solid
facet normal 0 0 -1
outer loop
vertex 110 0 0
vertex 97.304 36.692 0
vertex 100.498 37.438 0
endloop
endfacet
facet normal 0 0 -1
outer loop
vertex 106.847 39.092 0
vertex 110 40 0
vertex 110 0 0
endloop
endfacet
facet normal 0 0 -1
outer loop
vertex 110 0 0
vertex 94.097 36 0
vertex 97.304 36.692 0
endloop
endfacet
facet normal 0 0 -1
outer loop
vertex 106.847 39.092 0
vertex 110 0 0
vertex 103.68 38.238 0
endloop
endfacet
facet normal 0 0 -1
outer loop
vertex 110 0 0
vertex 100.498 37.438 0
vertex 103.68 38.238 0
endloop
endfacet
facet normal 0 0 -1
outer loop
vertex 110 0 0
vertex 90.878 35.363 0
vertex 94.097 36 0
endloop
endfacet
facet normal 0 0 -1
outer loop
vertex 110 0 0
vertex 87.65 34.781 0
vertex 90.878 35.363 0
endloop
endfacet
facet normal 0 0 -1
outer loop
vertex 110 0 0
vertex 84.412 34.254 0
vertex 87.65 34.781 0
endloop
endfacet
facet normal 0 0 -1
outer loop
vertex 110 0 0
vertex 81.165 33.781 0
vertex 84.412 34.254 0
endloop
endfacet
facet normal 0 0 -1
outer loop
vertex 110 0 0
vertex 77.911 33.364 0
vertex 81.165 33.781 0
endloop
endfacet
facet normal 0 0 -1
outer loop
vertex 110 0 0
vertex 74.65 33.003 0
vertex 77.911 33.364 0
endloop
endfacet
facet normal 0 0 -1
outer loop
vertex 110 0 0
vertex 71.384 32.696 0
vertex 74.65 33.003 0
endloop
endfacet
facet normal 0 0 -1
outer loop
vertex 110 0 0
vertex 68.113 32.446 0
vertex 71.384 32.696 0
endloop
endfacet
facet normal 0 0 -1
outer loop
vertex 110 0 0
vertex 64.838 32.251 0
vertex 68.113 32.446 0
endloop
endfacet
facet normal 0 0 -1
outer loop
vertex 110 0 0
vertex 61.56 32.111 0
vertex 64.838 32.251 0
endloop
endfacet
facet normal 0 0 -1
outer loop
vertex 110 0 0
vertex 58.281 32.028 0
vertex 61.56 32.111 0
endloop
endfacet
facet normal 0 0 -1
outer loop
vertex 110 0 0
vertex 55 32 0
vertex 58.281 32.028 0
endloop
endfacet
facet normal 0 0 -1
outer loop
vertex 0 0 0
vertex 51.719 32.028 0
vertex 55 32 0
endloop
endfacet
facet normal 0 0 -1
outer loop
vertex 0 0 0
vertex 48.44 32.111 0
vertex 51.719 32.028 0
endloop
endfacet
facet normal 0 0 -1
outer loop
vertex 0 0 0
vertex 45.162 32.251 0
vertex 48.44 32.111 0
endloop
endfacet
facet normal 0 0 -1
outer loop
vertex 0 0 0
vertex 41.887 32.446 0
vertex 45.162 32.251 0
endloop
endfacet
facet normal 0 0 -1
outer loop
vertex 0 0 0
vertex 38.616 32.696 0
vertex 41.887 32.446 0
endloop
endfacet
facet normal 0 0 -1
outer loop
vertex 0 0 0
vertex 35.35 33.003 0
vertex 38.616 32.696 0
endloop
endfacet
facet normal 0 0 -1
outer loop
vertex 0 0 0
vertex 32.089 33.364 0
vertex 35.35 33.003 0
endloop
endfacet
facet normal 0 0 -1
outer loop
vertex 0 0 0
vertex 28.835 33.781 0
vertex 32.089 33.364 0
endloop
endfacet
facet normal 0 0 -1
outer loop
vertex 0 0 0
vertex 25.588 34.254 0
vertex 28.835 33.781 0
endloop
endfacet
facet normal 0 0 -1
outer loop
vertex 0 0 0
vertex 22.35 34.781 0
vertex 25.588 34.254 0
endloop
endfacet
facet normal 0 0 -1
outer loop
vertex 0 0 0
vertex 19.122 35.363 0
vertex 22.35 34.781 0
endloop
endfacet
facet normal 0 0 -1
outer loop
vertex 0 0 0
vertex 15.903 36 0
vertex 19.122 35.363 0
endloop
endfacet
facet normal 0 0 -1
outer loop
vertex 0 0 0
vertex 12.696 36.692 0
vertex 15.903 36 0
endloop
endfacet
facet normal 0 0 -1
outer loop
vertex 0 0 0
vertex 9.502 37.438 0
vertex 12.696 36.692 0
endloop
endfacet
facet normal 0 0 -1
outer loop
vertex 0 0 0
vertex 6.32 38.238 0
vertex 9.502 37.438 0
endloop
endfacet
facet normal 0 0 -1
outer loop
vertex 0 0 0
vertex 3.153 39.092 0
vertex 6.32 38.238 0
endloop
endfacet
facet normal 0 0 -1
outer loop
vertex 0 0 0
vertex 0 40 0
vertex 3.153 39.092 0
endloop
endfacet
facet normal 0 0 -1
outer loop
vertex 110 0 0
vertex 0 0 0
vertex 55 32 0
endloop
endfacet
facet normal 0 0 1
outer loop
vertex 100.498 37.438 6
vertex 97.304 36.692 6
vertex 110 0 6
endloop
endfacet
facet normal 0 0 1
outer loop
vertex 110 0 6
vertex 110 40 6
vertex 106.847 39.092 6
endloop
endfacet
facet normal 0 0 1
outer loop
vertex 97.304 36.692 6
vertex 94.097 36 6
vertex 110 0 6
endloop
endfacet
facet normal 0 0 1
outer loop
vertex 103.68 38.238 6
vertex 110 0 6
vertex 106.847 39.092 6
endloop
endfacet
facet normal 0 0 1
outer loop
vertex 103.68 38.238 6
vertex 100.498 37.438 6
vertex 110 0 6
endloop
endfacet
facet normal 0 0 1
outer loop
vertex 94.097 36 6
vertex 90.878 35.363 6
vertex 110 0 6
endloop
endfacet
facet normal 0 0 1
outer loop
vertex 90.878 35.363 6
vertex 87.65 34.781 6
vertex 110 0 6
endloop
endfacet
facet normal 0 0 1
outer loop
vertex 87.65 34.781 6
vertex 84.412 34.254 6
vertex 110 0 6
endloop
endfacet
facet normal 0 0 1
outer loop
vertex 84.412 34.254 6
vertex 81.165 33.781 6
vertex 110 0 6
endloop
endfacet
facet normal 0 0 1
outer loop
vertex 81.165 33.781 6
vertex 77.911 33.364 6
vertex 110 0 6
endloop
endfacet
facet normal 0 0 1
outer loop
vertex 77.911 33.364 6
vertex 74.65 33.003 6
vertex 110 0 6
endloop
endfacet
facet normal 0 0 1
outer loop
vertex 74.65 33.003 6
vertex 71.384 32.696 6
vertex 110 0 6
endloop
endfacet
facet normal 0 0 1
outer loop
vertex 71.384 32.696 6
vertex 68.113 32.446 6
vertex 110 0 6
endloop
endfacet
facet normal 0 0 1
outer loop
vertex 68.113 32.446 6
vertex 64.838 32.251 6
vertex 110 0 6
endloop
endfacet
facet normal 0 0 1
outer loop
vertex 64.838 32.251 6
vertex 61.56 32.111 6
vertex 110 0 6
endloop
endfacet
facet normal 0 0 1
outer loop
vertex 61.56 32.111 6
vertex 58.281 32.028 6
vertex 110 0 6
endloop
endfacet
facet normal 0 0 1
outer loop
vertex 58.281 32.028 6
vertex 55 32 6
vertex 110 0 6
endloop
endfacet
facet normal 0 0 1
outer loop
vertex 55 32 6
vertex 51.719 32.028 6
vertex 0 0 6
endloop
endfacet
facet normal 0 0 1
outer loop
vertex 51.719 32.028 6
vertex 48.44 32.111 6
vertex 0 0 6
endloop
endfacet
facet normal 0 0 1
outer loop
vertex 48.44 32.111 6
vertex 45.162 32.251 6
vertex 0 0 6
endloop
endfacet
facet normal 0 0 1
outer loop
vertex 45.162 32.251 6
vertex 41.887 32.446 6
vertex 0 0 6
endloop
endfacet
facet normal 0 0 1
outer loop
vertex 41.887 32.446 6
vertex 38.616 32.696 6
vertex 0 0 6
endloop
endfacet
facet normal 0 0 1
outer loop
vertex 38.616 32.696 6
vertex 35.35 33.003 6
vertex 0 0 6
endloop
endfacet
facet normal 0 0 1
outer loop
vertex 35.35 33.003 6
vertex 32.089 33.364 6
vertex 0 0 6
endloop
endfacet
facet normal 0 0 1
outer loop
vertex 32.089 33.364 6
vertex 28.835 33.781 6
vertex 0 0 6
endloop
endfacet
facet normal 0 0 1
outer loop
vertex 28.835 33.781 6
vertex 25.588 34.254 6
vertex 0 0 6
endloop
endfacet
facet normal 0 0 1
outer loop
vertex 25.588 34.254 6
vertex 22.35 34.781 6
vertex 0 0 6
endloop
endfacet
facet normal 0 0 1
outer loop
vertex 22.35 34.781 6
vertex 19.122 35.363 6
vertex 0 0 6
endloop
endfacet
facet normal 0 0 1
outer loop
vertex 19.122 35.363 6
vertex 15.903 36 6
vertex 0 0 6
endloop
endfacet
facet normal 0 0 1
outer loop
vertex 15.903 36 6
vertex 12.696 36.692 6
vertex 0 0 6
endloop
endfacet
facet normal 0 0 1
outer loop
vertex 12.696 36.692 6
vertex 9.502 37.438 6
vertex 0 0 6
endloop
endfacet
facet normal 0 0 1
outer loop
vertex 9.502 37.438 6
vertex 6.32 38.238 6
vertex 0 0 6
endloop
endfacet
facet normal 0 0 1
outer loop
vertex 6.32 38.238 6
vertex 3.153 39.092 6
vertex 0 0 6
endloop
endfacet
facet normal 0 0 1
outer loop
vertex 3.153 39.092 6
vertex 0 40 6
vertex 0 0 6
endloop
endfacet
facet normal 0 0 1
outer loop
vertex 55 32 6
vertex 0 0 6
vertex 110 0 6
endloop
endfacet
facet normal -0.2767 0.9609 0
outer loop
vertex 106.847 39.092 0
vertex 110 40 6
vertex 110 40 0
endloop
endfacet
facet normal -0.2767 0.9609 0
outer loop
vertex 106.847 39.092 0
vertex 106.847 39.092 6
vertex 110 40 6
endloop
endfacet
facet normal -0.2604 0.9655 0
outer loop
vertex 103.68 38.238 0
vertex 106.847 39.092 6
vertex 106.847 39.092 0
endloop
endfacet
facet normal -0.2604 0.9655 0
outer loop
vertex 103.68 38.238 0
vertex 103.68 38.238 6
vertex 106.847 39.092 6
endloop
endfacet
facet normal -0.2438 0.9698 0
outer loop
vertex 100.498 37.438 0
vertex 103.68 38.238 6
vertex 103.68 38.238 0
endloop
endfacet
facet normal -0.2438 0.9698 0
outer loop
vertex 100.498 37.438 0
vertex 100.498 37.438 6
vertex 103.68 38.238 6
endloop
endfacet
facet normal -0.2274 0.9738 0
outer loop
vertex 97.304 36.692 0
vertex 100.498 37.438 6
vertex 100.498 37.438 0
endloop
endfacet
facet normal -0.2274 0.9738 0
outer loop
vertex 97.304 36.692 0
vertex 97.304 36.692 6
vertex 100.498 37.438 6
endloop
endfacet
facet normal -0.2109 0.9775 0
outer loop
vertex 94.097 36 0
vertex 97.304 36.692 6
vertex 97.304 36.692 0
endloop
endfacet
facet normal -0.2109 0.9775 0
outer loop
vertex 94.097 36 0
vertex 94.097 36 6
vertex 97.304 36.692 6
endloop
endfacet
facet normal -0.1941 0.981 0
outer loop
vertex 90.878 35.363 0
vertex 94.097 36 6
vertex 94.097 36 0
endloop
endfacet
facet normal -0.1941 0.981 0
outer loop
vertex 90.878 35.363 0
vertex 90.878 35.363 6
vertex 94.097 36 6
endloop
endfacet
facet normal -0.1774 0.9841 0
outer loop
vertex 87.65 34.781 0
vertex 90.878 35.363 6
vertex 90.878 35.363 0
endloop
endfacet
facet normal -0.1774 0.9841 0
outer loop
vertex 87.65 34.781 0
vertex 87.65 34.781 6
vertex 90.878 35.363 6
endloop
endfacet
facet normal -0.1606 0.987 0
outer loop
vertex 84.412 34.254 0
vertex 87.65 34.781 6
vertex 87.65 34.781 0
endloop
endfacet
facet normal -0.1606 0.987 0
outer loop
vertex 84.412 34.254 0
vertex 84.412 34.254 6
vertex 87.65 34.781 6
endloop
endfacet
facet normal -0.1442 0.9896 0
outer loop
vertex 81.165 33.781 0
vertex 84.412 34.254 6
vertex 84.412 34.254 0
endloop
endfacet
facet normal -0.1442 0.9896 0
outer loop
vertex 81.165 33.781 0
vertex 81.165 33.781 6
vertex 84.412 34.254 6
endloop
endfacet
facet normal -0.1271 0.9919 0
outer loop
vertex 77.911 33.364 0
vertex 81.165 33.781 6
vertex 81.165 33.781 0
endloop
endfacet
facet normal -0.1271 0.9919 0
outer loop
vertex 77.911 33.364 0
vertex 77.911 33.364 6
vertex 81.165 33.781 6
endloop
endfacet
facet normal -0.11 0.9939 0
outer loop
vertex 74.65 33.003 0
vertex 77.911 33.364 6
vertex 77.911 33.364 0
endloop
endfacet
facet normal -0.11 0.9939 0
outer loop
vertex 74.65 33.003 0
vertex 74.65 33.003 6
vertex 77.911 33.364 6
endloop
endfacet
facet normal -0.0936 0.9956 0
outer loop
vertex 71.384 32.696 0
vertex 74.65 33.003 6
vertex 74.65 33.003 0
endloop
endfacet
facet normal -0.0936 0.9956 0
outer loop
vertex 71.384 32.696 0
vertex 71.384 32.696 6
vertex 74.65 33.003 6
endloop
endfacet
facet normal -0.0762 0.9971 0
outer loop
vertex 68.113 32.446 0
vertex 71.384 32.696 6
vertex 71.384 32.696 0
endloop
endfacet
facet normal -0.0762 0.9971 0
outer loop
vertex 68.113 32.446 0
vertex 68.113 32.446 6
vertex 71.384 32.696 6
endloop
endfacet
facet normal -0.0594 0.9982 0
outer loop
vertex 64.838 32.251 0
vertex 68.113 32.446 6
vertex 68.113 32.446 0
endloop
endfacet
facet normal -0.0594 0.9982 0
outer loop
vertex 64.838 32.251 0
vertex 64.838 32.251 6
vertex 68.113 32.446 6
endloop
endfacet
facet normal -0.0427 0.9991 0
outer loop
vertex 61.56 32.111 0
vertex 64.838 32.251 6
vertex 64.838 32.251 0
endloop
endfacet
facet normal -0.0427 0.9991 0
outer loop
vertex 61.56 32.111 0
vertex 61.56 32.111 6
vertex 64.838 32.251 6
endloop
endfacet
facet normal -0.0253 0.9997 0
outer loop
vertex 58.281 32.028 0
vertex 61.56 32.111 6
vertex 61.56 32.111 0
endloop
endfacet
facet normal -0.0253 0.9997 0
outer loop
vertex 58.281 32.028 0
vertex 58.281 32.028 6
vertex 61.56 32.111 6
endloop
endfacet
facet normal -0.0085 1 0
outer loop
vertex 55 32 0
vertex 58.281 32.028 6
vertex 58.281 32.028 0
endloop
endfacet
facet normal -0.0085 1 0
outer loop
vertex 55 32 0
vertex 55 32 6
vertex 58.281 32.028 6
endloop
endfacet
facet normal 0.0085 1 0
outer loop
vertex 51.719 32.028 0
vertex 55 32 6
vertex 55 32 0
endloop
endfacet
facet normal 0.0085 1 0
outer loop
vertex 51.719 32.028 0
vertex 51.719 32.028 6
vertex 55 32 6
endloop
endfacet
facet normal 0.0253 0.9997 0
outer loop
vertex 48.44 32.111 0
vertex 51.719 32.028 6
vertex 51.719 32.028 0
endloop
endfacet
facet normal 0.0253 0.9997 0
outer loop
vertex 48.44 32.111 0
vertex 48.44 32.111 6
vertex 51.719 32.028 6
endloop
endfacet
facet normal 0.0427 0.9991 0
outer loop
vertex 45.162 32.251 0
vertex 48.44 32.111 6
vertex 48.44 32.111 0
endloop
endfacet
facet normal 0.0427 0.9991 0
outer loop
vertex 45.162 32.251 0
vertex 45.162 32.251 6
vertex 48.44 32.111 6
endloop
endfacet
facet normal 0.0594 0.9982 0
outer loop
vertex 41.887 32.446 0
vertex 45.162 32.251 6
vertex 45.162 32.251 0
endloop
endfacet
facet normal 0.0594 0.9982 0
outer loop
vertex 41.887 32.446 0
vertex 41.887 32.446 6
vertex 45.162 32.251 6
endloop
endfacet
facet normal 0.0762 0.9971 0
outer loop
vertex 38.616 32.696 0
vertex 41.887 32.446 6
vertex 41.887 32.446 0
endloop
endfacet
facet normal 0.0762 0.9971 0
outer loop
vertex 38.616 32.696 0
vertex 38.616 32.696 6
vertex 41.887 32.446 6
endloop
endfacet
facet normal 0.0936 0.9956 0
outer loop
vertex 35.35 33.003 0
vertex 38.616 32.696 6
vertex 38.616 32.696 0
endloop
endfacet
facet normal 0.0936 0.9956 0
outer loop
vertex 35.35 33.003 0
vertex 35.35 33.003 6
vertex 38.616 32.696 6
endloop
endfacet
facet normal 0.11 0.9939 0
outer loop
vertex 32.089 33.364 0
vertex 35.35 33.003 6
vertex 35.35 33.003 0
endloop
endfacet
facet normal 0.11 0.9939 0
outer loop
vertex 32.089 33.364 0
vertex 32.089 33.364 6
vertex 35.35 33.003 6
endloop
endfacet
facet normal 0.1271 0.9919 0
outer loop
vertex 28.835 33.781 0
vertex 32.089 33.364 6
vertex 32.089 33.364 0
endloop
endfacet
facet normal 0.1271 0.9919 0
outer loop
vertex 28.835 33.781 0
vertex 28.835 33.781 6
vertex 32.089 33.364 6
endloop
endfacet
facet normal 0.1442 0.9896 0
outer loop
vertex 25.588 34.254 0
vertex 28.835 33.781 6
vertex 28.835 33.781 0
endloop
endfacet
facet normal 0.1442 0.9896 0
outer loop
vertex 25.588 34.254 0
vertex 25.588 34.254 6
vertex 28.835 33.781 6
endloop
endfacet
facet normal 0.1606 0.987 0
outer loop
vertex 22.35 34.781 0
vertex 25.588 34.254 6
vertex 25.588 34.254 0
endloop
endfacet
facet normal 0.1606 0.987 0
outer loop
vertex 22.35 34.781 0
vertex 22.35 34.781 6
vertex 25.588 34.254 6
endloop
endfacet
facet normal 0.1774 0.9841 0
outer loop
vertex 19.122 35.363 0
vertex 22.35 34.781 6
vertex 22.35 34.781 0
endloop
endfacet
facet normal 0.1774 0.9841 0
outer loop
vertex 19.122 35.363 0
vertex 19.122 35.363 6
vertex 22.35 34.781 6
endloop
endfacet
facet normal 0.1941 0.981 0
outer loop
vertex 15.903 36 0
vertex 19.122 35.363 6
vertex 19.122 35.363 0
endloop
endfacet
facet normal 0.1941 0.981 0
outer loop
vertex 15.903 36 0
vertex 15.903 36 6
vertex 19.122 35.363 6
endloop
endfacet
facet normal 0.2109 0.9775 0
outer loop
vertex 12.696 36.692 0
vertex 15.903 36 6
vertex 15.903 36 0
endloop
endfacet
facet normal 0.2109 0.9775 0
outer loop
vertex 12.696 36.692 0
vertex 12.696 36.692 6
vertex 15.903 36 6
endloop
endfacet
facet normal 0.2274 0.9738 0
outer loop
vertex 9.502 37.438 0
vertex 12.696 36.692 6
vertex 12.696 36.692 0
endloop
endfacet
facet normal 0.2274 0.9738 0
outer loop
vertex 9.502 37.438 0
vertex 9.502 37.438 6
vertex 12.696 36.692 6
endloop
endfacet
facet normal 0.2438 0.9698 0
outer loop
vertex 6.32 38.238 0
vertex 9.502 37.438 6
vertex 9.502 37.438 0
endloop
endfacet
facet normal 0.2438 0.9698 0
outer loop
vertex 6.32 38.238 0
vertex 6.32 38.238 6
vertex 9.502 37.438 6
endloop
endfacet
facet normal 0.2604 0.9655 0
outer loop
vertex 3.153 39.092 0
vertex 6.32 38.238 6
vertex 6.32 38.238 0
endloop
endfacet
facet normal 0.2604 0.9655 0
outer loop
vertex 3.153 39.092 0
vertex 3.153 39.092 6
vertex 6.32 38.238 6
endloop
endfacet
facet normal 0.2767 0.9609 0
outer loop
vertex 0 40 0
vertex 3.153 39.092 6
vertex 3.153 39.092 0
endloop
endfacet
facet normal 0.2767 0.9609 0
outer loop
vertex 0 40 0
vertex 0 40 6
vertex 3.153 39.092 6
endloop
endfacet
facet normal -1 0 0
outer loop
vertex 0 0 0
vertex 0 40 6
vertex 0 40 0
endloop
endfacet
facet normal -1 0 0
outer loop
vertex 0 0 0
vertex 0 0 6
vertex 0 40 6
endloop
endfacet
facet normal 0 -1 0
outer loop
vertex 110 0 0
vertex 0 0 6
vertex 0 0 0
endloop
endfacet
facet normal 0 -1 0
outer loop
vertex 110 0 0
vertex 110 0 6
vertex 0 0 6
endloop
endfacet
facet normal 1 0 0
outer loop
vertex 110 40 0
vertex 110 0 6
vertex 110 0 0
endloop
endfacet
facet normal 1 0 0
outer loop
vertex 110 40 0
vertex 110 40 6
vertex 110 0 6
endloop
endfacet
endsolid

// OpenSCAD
$fn = 32;

// ----------------------------------------------------------------------
// Arc profile plate: notch, 37 points
// ----------------------------------------------------------------------

// --- parameters (mm) ---
bar_l = 110;              // bar length, X
bar_w = 40;               // bar width, Y
notch_depth = 8;          // depth of the arc notch at mid-span
arc_r = 193.06;           // radius of the notch arc
arc_angle = 33.1;         // notch arc angle, degrees
arc_step = 1;             // sampling step of the notch arc, degrees
plate_t = 6;              // plate thickness, Z

profile = [[0, 0], [110, 0], [110, 40], [106.847, 39.092], [103.68, 38.238], [100.498, 37.438], [97.304, 36.692], [94.097, 36], [90.878, 35.363], [87.65, 34.781], [84.412, 34.254], [81.165, 33.781], [77.911, 33.364], [74.65, 33.003], [71.384, 32.696], [68.113, 32.446], [64.838, 32.251], [61.56, 32.111], [58.281, 32.028], [55, 32], [51.719, 32.028], [48.44, 32.111], [45.162, 32.251], [41.887, 32.446], [38.616, 32.696], [35.35, 33.003], [32.089, 33.364], [28.835, 33.781], [25.588, 34.254], [22.35, 34.781], [19.122, 35.363], [15.903, 36], [12.696, 36.692], [9.502, 37.438], [6.32, 38.238], [3.153, 39.092], [0, 40]];  // primary outline, 37 points, counter clockwise

// --- the one profile operation ---
linear_extrude(height = plate_t) polygon(points = profile);
